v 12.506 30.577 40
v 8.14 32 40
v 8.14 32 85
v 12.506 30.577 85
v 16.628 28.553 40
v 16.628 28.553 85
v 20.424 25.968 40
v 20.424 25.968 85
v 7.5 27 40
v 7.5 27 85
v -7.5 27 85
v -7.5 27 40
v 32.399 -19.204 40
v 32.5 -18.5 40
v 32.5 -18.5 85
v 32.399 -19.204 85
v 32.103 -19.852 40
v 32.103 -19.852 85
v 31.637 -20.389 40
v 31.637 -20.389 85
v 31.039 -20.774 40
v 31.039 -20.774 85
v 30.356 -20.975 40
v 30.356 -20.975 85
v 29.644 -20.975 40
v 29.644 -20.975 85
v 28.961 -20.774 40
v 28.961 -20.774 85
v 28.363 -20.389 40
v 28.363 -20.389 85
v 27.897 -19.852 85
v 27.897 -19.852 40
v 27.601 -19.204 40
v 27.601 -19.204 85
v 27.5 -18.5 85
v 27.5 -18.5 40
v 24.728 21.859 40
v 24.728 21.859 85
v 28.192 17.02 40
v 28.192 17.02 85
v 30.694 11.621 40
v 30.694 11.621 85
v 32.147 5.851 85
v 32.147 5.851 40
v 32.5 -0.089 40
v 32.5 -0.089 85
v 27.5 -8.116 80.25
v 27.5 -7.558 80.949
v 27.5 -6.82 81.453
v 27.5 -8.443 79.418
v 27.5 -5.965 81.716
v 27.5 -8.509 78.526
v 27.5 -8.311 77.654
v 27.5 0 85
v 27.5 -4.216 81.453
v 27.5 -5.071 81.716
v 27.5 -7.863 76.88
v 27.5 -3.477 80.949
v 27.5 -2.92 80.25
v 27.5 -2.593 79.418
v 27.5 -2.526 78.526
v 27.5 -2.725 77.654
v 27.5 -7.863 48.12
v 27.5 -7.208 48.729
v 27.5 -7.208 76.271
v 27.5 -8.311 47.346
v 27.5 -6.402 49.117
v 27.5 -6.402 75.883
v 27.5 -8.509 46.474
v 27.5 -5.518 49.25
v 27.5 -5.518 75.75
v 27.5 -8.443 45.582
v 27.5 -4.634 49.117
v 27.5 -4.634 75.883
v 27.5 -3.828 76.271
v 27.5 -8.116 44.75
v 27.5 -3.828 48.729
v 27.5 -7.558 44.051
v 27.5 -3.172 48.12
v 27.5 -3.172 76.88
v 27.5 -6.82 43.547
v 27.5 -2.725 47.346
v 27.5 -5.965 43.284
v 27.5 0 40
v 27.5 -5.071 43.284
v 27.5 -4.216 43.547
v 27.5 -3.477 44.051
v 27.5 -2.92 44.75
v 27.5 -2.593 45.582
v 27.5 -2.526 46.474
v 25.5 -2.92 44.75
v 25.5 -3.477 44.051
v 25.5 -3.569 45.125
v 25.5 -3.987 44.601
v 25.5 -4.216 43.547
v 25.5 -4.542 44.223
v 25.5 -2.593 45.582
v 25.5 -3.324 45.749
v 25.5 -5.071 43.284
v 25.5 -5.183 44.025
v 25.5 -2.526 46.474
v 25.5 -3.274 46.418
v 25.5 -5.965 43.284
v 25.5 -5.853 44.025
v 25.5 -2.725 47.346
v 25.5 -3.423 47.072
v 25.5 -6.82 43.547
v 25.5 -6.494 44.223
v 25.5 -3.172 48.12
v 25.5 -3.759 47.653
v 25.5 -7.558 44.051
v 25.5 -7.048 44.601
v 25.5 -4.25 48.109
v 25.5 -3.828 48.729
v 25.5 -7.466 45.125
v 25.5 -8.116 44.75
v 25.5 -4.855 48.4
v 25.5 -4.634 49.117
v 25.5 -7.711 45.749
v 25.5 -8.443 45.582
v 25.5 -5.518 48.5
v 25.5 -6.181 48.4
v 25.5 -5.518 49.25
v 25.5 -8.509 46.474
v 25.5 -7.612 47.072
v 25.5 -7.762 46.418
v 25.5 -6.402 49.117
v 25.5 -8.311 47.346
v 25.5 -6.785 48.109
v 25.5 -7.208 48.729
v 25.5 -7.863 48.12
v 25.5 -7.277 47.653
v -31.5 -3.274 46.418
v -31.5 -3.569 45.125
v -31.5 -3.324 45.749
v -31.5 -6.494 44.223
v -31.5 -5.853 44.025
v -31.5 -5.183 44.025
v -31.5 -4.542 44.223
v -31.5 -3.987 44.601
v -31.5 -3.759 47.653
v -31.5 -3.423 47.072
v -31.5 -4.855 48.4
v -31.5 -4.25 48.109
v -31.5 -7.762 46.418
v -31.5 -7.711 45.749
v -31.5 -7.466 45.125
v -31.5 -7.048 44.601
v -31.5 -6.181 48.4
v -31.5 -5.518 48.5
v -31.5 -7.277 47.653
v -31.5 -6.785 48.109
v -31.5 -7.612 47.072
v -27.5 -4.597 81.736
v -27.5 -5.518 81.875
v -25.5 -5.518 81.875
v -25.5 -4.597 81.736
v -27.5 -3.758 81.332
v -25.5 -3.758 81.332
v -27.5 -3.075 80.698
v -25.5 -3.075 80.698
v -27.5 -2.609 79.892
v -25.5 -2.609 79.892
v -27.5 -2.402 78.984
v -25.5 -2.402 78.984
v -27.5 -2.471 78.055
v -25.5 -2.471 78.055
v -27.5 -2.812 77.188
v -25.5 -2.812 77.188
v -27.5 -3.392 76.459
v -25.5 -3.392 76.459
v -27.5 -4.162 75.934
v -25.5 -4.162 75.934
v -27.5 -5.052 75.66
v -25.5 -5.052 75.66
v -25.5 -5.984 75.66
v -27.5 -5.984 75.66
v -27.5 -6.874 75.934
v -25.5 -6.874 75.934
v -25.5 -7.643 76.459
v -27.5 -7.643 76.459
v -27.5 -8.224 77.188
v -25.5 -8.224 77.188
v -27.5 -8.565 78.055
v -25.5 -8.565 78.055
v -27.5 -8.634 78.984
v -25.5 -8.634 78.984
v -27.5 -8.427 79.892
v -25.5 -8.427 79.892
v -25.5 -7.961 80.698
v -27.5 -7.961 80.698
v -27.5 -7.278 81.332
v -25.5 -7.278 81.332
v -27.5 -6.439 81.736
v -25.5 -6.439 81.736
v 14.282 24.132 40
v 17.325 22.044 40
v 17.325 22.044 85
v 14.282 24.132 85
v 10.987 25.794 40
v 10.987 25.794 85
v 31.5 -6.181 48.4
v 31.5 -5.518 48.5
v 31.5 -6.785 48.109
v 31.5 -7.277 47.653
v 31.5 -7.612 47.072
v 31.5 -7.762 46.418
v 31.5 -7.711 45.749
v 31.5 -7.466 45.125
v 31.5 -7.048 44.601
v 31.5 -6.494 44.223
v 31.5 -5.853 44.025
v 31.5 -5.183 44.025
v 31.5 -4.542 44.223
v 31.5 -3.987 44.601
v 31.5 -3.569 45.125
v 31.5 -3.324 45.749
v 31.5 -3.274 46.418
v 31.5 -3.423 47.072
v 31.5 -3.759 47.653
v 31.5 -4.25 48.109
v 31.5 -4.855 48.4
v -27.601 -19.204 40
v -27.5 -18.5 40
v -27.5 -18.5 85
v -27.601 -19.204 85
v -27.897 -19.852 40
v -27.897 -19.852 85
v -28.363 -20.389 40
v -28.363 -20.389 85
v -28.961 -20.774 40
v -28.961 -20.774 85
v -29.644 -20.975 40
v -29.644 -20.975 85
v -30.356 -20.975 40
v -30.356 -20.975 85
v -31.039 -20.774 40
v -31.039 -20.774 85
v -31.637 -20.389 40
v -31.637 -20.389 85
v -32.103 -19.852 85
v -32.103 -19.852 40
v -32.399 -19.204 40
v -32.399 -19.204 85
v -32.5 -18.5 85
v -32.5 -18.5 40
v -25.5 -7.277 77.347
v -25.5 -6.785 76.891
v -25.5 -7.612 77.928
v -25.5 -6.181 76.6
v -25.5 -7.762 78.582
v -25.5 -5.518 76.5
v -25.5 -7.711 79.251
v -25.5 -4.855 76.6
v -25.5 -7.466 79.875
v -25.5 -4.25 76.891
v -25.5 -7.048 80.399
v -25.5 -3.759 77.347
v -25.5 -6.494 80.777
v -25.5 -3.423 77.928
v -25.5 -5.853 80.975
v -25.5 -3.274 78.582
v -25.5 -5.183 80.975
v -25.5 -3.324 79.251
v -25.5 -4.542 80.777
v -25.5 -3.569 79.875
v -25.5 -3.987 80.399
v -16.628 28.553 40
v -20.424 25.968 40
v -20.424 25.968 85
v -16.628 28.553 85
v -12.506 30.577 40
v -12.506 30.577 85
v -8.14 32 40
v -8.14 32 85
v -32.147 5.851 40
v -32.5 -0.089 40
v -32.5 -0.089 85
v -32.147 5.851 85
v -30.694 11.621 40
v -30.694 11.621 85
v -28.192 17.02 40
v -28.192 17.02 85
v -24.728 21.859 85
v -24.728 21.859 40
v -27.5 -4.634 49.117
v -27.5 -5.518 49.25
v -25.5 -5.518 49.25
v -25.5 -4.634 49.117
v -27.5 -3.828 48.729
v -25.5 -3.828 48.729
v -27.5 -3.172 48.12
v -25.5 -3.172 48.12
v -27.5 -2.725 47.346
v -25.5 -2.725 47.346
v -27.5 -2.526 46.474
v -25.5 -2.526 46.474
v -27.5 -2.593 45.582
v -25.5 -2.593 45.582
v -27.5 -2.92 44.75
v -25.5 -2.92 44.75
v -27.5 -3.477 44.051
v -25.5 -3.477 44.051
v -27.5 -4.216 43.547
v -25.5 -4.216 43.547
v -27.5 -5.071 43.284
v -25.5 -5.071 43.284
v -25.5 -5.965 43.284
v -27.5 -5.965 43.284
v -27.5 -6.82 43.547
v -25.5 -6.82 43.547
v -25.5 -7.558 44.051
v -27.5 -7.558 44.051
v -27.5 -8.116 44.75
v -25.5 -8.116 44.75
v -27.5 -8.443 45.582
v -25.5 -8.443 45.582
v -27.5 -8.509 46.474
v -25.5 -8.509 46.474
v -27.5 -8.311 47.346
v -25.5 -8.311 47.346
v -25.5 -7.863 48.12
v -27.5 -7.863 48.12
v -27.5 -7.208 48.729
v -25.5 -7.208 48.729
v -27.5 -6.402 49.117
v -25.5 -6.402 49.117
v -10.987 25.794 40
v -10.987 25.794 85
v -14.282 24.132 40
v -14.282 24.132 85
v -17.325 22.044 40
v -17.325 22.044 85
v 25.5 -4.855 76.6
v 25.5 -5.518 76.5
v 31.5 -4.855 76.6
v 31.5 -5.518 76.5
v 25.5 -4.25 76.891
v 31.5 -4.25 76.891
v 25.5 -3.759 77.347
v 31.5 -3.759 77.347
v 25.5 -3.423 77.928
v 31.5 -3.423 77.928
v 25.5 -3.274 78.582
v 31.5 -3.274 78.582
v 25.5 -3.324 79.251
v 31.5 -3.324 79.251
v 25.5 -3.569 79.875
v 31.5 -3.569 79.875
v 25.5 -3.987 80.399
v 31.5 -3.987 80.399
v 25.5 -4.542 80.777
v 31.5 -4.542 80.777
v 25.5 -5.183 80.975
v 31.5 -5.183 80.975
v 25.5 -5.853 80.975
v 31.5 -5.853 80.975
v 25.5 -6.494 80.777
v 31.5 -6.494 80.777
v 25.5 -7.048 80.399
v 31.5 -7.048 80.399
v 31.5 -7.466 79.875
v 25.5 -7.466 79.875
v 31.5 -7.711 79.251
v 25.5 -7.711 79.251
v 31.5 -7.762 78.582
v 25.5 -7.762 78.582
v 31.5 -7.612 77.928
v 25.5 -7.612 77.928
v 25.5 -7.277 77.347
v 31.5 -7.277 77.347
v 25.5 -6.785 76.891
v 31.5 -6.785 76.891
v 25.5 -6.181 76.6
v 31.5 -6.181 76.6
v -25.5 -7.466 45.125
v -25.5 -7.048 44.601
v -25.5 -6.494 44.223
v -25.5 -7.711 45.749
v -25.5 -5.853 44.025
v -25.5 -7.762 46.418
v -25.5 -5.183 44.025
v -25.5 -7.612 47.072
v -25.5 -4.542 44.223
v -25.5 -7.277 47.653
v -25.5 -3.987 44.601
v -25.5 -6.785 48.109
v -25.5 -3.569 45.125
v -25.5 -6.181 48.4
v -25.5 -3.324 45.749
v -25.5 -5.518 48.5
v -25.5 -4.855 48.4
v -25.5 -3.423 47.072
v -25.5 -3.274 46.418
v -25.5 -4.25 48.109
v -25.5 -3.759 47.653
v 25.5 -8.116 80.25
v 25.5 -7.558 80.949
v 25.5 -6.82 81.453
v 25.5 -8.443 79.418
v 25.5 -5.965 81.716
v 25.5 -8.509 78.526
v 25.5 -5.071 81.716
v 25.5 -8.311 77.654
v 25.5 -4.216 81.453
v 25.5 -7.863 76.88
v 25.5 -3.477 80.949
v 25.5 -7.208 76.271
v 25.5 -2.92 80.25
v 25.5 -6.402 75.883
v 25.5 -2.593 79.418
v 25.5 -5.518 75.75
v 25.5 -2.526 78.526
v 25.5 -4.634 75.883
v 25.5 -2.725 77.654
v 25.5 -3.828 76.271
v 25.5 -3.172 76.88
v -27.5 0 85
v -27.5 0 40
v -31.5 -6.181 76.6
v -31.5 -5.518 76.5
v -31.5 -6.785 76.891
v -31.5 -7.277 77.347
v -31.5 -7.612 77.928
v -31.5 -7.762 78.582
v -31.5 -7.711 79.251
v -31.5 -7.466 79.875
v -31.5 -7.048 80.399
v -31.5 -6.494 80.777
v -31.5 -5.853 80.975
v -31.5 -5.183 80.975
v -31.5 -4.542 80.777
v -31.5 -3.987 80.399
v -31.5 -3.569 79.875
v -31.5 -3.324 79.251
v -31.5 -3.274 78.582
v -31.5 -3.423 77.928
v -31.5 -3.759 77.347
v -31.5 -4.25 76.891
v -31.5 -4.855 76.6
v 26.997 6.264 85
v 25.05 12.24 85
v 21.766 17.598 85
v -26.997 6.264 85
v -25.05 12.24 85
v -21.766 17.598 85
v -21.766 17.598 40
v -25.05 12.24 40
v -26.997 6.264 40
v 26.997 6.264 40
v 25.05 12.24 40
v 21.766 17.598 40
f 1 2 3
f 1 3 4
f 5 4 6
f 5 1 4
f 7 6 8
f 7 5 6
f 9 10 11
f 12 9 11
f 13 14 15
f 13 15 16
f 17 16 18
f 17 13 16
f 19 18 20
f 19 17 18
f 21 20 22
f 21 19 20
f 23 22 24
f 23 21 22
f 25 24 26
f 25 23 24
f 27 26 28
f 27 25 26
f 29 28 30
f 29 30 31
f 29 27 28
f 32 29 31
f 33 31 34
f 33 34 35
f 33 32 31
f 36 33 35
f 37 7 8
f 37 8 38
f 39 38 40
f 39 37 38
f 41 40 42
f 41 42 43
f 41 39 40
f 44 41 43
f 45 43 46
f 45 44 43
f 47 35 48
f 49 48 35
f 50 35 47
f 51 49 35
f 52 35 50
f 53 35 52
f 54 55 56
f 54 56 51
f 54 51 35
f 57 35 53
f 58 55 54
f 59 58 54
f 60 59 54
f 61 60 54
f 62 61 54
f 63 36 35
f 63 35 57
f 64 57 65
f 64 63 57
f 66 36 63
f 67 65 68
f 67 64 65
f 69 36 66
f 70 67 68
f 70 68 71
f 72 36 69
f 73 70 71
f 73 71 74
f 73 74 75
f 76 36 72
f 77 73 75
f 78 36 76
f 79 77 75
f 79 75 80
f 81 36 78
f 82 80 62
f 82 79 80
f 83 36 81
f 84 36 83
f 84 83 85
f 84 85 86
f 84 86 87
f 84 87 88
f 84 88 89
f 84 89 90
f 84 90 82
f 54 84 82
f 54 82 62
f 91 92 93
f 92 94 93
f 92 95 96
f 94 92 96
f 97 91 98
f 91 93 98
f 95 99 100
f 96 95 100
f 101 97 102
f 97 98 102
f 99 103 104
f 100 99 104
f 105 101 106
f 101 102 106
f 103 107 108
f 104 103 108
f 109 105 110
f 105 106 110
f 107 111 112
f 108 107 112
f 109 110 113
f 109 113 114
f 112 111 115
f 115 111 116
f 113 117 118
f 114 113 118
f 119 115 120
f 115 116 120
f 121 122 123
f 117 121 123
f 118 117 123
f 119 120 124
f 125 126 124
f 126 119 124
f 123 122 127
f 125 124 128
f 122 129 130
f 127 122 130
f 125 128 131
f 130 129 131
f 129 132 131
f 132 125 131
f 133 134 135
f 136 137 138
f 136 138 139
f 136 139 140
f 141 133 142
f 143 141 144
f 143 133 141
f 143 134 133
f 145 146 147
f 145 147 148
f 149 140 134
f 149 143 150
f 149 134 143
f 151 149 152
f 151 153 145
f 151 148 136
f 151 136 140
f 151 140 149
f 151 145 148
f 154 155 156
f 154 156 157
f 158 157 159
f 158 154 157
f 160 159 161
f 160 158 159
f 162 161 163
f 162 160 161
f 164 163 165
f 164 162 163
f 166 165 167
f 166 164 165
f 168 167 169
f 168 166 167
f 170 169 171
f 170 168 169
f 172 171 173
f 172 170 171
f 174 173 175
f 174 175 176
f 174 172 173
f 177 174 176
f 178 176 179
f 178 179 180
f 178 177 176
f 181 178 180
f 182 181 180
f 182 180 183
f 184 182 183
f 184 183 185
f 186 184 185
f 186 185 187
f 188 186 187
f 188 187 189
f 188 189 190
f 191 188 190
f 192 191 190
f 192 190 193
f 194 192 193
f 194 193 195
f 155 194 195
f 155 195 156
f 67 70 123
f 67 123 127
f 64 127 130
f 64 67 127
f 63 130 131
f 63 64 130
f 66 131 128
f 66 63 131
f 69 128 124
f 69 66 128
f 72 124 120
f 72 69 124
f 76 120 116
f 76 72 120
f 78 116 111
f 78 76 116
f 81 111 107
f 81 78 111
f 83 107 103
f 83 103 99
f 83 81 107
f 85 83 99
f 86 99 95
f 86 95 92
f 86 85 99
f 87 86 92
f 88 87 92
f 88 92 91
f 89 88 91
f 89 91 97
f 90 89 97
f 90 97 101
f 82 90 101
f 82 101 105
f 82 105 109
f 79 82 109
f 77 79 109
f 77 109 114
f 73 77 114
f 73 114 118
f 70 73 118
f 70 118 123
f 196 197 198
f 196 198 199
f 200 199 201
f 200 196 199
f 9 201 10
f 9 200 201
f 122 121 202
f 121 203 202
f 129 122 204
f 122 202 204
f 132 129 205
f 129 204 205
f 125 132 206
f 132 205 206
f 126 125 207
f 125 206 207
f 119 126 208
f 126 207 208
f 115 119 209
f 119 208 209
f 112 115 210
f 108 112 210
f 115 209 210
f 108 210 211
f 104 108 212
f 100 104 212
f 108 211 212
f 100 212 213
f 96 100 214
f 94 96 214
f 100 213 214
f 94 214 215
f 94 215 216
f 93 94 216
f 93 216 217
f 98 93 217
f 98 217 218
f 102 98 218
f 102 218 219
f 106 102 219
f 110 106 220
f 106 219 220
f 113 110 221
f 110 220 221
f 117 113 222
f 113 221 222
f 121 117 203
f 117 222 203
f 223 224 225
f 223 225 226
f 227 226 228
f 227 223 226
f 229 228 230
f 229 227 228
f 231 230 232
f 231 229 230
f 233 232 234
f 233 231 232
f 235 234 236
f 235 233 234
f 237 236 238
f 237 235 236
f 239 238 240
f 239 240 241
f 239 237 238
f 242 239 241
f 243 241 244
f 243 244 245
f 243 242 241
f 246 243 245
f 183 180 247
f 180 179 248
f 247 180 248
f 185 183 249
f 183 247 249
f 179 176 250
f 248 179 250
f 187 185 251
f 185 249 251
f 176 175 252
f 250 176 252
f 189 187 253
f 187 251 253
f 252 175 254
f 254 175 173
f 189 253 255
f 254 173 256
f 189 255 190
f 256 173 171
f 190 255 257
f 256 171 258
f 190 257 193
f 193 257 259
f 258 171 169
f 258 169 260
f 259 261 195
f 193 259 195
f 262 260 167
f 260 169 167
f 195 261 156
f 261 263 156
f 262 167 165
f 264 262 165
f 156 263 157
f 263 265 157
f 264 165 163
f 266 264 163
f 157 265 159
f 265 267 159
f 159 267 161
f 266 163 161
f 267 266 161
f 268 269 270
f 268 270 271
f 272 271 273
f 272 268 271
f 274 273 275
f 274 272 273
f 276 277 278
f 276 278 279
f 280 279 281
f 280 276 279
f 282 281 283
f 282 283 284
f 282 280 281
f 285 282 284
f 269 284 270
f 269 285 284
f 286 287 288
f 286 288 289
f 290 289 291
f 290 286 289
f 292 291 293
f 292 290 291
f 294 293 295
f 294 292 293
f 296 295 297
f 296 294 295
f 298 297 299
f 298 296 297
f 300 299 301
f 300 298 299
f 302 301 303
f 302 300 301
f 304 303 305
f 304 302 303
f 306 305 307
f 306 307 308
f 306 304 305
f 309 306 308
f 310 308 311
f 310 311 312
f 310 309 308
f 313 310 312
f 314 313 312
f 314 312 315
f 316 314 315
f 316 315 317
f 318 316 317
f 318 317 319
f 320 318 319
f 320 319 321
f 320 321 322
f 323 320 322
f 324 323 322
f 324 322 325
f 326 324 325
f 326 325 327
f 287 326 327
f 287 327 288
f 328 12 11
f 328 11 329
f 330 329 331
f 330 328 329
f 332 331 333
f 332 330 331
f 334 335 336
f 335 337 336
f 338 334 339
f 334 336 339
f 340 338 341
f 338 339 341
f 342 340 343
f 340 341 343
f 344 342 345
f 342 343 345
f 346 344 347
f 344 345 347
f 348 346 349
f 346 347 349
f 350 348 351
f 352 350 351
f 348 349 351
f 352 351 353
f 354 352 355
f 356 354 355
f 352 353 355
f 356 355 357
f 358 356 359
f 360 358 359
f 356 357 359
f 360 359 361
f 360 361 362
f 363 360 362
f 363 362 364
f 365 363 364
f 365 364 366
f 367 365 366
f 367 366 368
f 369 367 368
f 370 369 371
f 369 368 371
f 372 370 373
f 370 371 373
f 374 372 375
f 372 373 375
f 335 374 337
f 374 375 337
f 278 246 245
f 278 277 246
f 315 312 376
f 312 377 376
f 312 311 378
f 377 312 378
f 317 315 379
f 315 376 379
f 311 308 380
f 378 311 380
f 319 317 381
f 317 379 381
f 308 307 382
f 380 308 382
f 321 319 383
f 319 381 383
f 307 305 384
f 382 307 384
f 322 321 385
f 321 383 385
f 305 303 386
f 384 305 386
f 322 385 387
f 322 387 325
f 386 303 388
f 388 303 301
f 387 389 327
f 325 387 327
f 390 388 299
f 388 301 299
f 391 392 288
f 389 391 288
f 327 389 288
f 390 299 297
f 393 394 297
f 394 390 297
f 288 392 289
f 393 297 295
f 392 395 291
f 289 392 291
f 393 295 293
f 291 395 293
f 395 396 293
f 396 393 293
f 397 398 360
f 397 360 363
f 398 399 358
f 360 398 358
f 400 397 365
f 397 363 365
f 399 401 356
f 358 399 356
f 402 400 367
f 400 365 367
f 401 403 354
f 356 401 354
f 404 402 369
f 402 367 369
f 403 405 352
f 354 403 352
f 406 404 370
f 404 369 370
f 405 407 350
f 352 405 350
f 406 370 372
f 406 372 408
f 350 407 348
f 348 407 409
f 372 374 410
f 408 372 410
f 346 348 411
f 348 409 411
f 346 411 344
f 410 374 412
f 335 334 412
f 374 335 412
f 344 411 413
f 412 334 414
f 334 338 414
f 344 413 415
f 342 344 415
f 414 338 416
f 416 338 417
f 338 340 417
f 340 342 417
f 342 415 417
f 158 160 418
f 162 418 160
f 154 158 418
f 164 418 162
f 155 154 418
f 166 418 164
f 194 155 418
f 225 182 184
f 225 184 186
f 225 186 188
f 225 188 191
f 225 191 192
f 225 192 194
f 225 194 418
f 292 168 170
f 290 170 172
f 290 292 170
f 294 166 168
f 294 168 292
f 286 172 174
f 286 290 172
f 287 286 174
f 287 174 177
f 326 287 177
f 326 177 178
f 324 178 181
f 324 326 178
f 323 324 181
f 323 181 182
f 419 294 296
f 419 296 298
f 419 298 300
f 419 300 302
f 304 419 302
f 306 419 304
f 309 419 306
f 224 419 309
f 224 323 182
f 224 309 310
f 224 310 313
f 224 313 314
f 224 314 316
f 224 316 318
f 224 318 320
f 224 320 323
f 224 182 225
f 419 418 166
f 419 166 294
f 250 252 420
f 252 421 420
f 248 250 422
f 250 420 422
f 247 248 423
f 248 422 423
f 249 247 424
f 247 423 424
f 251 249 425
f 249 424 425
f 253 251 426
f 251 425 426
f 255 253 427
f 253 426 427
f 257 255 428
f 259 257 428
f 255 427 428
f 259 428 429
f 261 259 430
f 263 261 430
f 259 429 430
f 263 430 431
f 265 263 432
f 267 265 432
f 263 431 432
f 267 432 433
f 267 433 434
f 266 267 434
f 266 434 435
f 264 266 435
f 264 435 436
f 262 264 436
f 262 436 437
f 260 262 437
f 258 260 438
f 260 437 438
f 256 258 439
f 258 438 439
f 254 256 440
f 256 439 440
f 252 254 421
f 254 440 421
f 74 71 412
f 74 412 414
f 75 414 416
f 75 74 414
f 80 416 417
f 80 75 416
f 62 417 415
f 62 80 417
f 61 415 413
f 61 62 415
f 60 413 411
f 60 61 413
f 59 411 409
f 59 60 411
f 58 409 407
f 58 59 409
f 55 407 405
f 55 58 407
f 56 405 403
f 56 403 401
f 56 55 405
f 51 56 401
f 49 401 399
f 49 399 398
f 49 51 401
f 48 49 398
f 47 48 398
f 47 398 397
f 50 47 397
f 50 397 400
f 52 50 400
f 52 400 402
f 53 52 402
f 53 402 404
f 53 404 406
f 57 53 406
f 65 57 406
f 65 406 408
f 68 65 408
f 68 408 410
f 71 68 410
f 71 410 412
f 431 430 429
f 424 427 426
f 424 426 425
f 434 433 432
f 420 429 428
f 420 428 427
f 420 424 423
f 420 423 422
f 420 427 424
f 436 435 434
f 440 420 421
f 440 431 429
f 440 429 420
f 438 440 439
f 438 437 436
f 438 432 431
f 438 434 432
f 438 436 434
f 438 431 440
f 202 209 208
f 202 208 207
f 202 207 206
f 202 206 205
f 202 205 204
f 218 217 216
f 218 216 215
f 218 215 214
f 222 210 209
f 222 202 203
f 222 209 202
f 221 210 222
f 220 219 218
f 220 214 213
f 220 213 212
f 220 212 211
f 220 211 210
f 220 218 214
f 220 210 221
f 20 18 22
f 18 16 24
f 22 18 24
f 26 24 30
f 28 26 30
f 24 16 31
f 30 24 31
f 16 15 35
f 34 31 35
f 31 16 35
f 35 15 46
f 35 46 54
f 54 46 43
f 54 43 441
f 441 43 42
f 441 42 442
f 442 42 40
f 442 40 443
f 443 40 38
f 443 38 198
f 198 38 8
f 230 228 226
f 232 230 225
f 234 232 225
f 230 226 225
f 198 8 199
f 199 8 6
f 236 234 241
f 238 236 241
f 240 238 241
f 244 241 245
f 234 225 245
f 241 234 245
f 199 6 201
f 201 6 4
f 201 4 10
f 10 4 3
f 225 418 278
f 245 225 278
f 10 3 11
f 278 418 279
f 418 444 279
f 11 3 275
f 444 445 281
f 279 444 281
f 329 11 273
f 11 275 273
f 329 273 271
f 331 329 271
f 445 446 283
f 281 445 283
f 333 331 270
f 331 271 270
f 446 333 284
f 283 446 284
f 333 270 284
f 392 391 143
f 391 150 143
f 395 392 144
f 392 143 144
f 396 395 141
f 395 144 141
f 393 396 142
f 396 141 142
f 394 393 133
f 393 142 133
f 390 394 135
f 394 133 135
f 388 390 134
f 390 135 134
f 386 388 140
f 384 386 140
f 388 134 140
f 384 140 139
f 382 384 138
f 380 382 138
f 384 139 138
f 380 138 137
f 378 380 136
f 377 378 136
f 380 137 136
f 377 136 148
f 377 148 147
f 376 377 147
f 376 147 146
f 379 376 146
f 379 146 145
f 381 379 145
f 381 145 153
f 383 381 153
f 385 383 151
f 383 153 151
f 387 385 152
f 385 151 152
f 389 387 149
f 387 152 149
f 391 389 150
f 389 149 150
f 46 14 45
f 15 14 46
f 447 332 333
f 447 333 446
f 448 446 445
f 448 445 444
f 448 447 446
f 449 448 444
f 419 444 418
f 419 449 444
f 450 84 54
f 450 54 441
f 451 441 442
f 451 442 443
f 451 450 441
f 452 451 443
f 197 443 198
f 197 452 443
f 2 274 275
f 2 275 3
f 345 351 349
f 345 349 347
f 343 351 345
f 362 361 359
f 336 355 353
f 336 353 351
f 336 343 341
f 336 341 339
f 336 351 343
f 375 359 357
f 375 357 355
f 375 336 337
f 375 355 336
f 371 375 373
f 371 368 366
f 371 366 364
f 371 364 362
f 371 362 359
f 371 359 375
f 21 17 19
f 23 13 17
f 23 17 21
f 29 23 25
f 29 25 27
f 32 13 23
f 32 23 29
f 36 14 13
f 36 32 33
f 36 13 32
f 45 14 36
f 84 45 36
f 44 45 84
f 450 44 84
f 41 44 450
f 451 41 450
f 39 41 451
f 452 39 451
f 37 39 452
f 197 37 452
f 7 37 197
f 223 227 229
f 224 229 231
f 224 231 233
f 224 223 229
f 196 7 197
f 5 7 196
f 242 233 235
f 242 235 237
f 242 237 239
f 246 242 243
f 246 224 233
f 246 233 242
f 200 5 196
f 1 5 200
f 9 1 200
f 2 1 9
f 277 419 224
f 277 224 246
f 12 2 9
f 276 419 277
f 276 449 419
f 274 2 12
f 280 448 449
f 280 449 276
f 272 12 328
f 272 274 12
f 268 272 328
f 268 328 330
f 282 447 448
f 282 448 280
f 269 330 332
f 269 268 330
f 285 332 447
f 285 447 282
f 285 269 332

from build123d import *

# Parameters (mm, degrees)
SKETCH1_W                           = 50
SKETCH1_H                           = 50
BOSS_EXTRUDE1_DEPTH                 = 60
CUT_EXTRUDE1_DEPTH                  = 60
CUT_EXTRUDE2_START                  = -60
CUT_EXTRUDE2_DEPTH                  = 60
SKETCH5_OUTSIDE_W                   = 70.548
SKETCH5_OUTSIDE_H                   = 70.548
CUT_EXTRUDE3_DEPTH                  = 10
CUT_EXTRUDE4_DEPTH                  = 10
FILLET1_R                           = 1
SKETCH7_R                           = 2
BOSS_EXTRUDE2_DEPTH                 = 2
BOSS_EXTRUDE3_START                 = 2
SKETCH8_R                           = 2
BOSS_EXTRUDE3_DEPTH                 = 2
SKETCH9_R                           = 2.25
CUT_EXTRUDE5_DEPTH                  = 2
CUT_EXTRUDE6_START                  = -2
SKETCH10_R                          = 2.25
CUT_EXTRUDE6_DEPTH                  = 2
FILLET2_R                           = 1
CUT_EXTRUDE7_REACH                  = 71.642
CUT_EXTRUDE7_END_RADIUS             = 25
CUT_EXTRUDE7_DIRECTION_2_REACH      = 71.642
CUT_EXTRUDE7_DIRECTION_2_END_RADIUS = 25
BOSS_EXTRUDE4_DEPTH                 = 35
BOSS_EXTRUDE4_DEPTH_BACK            = 10
SKETCH14_R                          = 2
BOSS_EXTRUDE5_DEPTH                 = 0.1
SKETCH15_R                          = 3
SKETCH15_R_2                        = 2.25
BOSS_EXTRUDE6_DEPTH                 = 7
SKETCH16_R                          = 2.25
CUT_EXTRUDE8_DEPTH                  = 2
SKETCH17_W                          = 10
SKETCH17_H                          = 10
CUT_EXTRUDE9_DEPTH                  = 29.758852585
SKETCH18_W                          = 10
SKETCH18_H                          = 14.003619208
CUT_EXTRUDE10_DEPTH                 = 31.758852585
SKETCH20_R                          = 3
SKETCH20_R_2                        = 2.25
BOSS_EXTRUDE8_DEPTH                 = 7
SKETCH21_R                          = 2.25
CUT_EXTRUDE11_DEPTH                 = 4
CUT_EXTRUDE12_DEPTH                 = 40
SKETCH23_R                          = 2.25
CUT_EXTRUDE13_DEPTH                 = 4
SKETCH24_R                          = 2.25
CUT_EXTRUDE14_DEPTH                 = 2
SKETCH25_R                          = 3.125
SKETCH25_R_2                        = 2.25
BOSS_EXTRUDE9_DEPTH                 = 7
SKETCH26_R                          = 2.25
CUT_EXTRUDE15_DEPTH                 = 4


# Read off the part's stored shape, not the designer's step: Cut-Extrude2
with BuildPart() as part:
    # Sketch1 → Boss-Extrude1 (new body)
    with BuildSketch(Plane.XY):
        Rectangle(SKETCH1_W, SKETCH1_H)
    extrude(amount=BOSS_EXTRUDE1_DEPTH)

    # Sketch3 → Cut-Extrude1 (cut)
    with BuildSketch(Plane.XY.offset(60)):
        with BuildLine():
            Line((-25, 25), (-25, 0))
            ThreePointArc((-25, 0), (-17.677669541, 17.677669518), (-3.2e-08, 25))
            Line((-3.2e-08, 25), (-25, 25))
        make_face()
        with BuildLine():
            Line((25, 25), (-3.2e-08, 25))
            ThreePointArc((-3.2e-08, 25), (17.677669518, 17.677669541), (25, 0))
            Line((25, 0), (25, 25))
        make_face()
    extrude(amount=-CUT_EXTRUDE1_DEPTH, mode=Mode.SUBTRACT)

    # Cut-Extrude2 outline → Cut-Extrude2 (cut)
    with BuildSketch(Plane.XY.offset(60).offset(CUT_EXTRUDE2_START)):
        with BuildLine():
            ThreePointArc((8.576916353, -23.025834486), (10.616475204, -9.420494413), (7.92577262, 4.071177033))
            ThreePointArc((7.92577262, 4.071177033), (0, 9.5), (-7.92577262, 4.071177033))
            ThreePointArc((-7.92577262, 4.071177033), (-10.616475204, -9.420494413), (-8.576916353, -23.025834486))
            ThreePointArc((-8.576916353, -23.025834486), (-8.783191003, -24.377140732), (-10, -25))
            Line((-10, -25), (10, -25))
            ThreePointArc((10, -25), (8.783191003, -24.377140732), (8.576916353, -23.025834486))
        make_face()
        with BuildLine():
            ThreePointArc((25, -11.035759956), (21.246950766, -20.57515197), (12, -25))
            Line((12, -25), (25, -25))
            Line((25, -25), (25, -11.035759956))
        make_face()
        with BuildLine():
            Line((-25, -25), (-12, -25))
            ThreePointArc((-12, -25), (-21.246950766, -20.57515197), (-25, -11.035759956))
            Line((-25, -11.035759956), (-25, -25))
        make_face()
    extrude(amount=CUT_EXTRUDE2_DEPTH, mode=Mode.SUBTRACT)

    # Sketch5 outside → Cut-Extrude3 (cut)
    with BuildSketch(Plane.XY.offset(60)):
        Rectangle(SKETCH5_OUTSIDE_W, SKETCH5_OUTSIDE_H)
        with BuildLine():
            Line((-7.92577262, 4.071177033), (-12.879426293, 4.071177033))
            Line((-12.879426293, 4.071177033), (-12.879426293, -5.928822967))
            Line((-12.879426293, -5.928822967), (-10.379426293, -5.928822967))
            ThreePointArc((-10.379426293, -5.928822967), (-9.475712618, -0.849542187), (-7.92577262, 4.071177033))
        make_face(mode=Mode.SUBTRACT)
        with BuildLine():
            Line((7.92577262, 4.071177033), (12.879426293, 4.071177033))
            Line((12.879426293, 4.071177033), (12.879426293, -5.928822967))
            Line((12.879426293, -5.928822967), (10.379426293, -5.928822967))
            ThreePointArc((10.379426293, -5.928822967), (9.475712618, -0.849542187), (7.92577262, 4.071177033))
        make_face(mode=Mode.SUBTRACT)
    extrude(amount=-CUT_EXTRUDE3_DEPTH, mode=Mode.SUBTRACT)

    # Sketch6 → Cut-Extrude4 (cut)
    # profile 1 of 4: a face of its own
    with BuildSketch(Plane(origin=(0, 0, 0), x_dir=(-1, 0, 0), z_dir=(0, 0, -1))):
        with BuildLine():
            Line((0, 9.5), (0, 25))
            ThreePointArc((0, 25), (-17.67766953, 17.67766953), (-25, 0))
            Line((-25, 0), (-25, -11.035759956))
            ThreePointArc((-25, -11.035759956), (-21.246950766, -20.57515197), (-12, -25))
            Line((-12, -25), (-10, -25))
            ThreePointArc((-10, -25), (-8.783191003, -24.377140732), (-8.576916353, -23.025834486))
            ThreePointArc((-8.576916353, -23.025834486), (-10.289550459, -15.574005024), (-10.552980025, -7.932442175))
            ThreePointArc((-10.552980025, -7.932442175), (-10.478797406, -6.929541656), (-10.379426293, -5.928822967))
            ThreePointArc((-10.379426293, -5.928822967), (-9.475712618, -0.849542187), (-7.92577262, 4.071177033))
            ThreePointArc((-7.92577262, 4.071177033), (-4.803383975, 8.012667281), (0, 9.5))
        make_face()
        with BuildLine():
            Line((-12.879426293, 6.071177033), (-12.879426293, 3.071177033))
            Line((-12.879426293, 3.071177033), (-12.879426293, -4.928822967))
            Line((-12.879426293, -4.928822967), (-12.879426293, -7.932442175))
            Line((-12.879426293, -7.932442175), (-14.879423018, -7.932442175))
            ThreePointArc((-14.879423018, -7.932442175), (-15.586532115, -7.639547997), (-15.879426293, -6.932438901))
            Line((-15.879426293, -6.932438901), (-15.879426293, 5.071173759))
            ThreePointArc((-15.879426293, 5.071173759), (-15.586532115, 5.778282855), (-14.879423018, 6.071177033))
            Line((-14.879423018, 6.071177033), (-12.879426293, 6.071177033))
        make_face(mode=Mode.SUBTRACT)
    # profile 2 of 4: a face of its own
    with BuildSketch(Plane(origin=(0, 0, 0), x_dir=(-1, 0, 0), z_dir=(0, 0, -1))):
        with BuildLine():
            ThreePointArc((25, 0), (17.67766953, 17.67766953), (0, 25))
            Line((0, 25), (0, 9.5))
            ThreePointArc((0, 9.5), (4.803383975, 8.012667281), (7.92577262, 4.071177033))
            ThreePointArc((7.92577262, 4.071177033), (10.616475204, -9.420494413), (8.576916353, -23.025834486))
            ThreePointArc((8.576916353, -23.025834486), (8.783191003, -24.377140732), (10, -25))
            Line((10, -25), (12, -25))
            ThreePointArc((12, -25), (21.246950766, -20.57515197), (25, -11.035759956))
            Line((25, -11.035759956), (25, 0))
        make_face()
        with BuildLine():
            Line((12.879426293, -4.928822967), (12.879426293, 3.071177033))
            Line((12.879426293, 3.071177033), (12.879426293, 6.071177033))
            Line((12.879426293, 6.071177033), (14.879423018, 6.071177033))
            ThreePointArc((14.879423018, 6.071177033), (15.586532115, 5.778282855), (15.879426293, 5.071173759))
            Line((15.879426293, 5.071173759), (15.879426293, -6.932438901))
            ThreePointArc((15.879426293, -6.932438901), (15.586532115, -7.639547997), (14.879423018, -7.932442175))
            Line((14.879423018, -7.932442175), (12.879426293, -7.932442175))
            Line((12.879426293, -7.932442175), (12.879426293, -4.928822967))
        make_face(mode=Mode.SUBTRACT)
    # profile 3 of 4: a face of its own
    with BuildSketch(Plane(origin=(0, 0, 0), x_dir=(-1, 0, 0), z_dir=(0, 0, -1))):
        with BuildLine():
            Line((0, 9.5), (0, 25))
            ThreePointArc((0, 25), (-17.67766953, 17.67766953), (-25, 0))
            Line((-25, 0), (-25, -11.035759956))
            ThreePointArc((-25, -11.035759956), (-21.246950766, -20.57515197), (-12, -25))
            Line((-12, -25), (-10, -25))
            ThreePointArc((-10, -25), (-8.783191003, -24.377140732), (-8.576916353, -23.025834486))
            ThreePointArc((-8.576916353, -23.025834486), (-10.289550459, -15.574005024), (-10.552980025, -7.932442175))
            ThreePointArc((-10.552980025, -7.932442175), (-10.478797406, -6.929541656), (-10.379426293, -5.928822967))
            ThreePointArc((-10.379426293, -5.928822967), (-9.475712618, -0.849542187), (-7.92577262, 4.071177033))
            ThreePointArc((-7.92577262, 4.071177033), (-4.803383975, 8.012667281), (0, 9.5))
        make_face()
        with BuildLine():
            Line((-12.879426293, 6.071177033), (-12.879426293, 3.071177033))
            Line((-12.879426293, 3.071177033), (-12.879426293, -4.928822967))
            Line((-12.879426293, -4.928822967), (-12.879426293, -7.932442175))
            Line((-12.879426293, -7.932442175), (-14.879423018, -7.932442175))
            ThreePointArc((-14.879423018, -7.932442175), (-15.586532115, -7.639547997), (-15.879426293, -6.932438901))
            Line((-15.879426293, -6.932438901), (-15.879426293, 5.071173759))
            ThreePointArc((-15.879426293, 5.071173759), (-15.586532115, 5.778282855), (-14.879423018, 6.071177033))
            Line((-14.879423018, 6.071177033), (-12.879426293, 6.071177033))
        make_face(mode=Mode.SUBTRACT)
    # profile 4 of 4: a face of its own
    with BuildSketch(Plane(origin=(0, 0, 0), x_dir=(-1, 0, 0), z_dir=(0, 0, -1))):
        with BuildLine():
            ThreePointArc((25, 0), (17.67766953, 17.67766953), (0, 25))
            Line((0, 25), (0, 9.5))
            ThreePointArc((0, 9.5), (4.803383975, 8.012667281), (7.92577262, 4.071177033))
            ThreePointArc((7.92577262, 4.071177033), (10.616475204, -9.420494413), (8.576916353, -23.025834486))
            ThreePointArc((8.576916353, -23.025834486), (8.783191003, -24.377140732), (10, -25))
            Line((10, -25), (12, -25))
            ThreePointArc((12, -25), (21.246950766, -20.57515197), (25, -11.035759956))
            Line((25, -11.035759956), (25, 0))
        make_face()
        with BuildLine():
            Line((12.879426293, -4.928822967), (12.879426293, 3.071177033))
            Line((12.879426293, 3.071177033), (12.879426293, 6.071177033))
            Line((12.879426293, 6.071177033), (14.879423018, 6.071177033))
            ThreePointArc((14.879423018, 6.071177033), (15.586532115, 5.778282855), (15.879426293, 5.071173759))
            Line((15.879426293, 5.071173759), (15.879426293, -6.932438901))
            ThreePointArc((15.879426293, -6.932438901), (15.586532115, -7.639547997), (14.879423018, -7.932442175))
            Line((14.879423018, -7.932442175), (12.879426293, -7.932442175))
            Line((12.879426293, -7.932442175), (12.879426293, -4.928822967))
        make_face(mode=Mode.SUBTRACT)
    extrude(amount=-CUT_EXTRUDE4_DEPTH, mode=Mode.SUBTRACT)

    # Fillet1
    fillet1_edges = [part.edges().sort_by_distance(p)[0] for p in [
        (12.879426293, 4.071177033, 55),
        (12.879426293, -5.928822967, 55),
        (-12.879426293, -5.928822967, 55),
        (-12.879426293, 4.071177033, 55),
    ]]
    fillet(fillet1_edges, radius=FILLET1_R)

    # Sketch7 → Boss-Extrude2 (add)
    with BuildSketch(Plane.ZY.offset(12.879426293)):
        with Locations(Location((55, -0.928822967, 0), (0, 0, 270))):
            Circle(SKETCH7_R)
    extrude(amount=BOSS_EXTRUDE2_DEPTH)

    # Sketch8 → Boss-Extrude3 (add)
    with BuildSketch(Plane(origin=(12.879426293, 0, 0), x_dir=(0, 0, -1), z_dir=(1, 0, 0)).offset(BOSS_EXTRUDE3_START)):
        with Locations(Location((-55, -0.928822967, 0), (0, 0, 270))):
            Circle(SKETCH8_R)
    extrude(amount=-BOSS_EXTRUDE3_DEPTH)

    # Sketch9 → Cut-Extrude5 (cut)
    with BuildSketch(Plane.ZY.offset(-12.879426293)):
        with Locations(Location((5, -0.930632571, 0), (0, 0, 270))):
            Circle(SKETCH9_R)
    extrude(amount=-CUT_EXTRUDE5_DEPTH, mode=Mode.SUBTRACT)

    # Sketch10 → Cut-Extrude6 (cut)
    with BuildSketch(Plane(origin=(-12.879426293, 0, 0), x_dir=(0, 0, -1), z_dir=(1, 0, 0)).offset(CUT_EXTRUDE6_START)):
        with Locations(Location((-5, -0.930632571, 0), (0, 0, 270))):
            Circle(SKETCH10_R)
    extrude(amount=CUT_EXTRUDE6_DEPTH, mode=Mode.SUBTRACT)

    # Fillet2
    fillet2_edges = [part.edges().sort_by_distance(p)[0] for p in [
        (-12.879426293, 6.071177033, 5),
        (-12.879426293, -7.932442175, 5),
        (12.879426293, -7.932442175, 5),
        (12.879426293, 6.071177033, 5),
    ]]
    fillet(fillet2_edges, radius=FILLET2_R)

    # Cut-Extrude7: up to this cylinder (the profile starts inside it)
    cut_extrude7_end = Plane(origin=(0, 0, 27.7442175), z_dir=(0, 0, 1)) * Cylinder(CUT_EXTRUDE7_END_RADIUS, 227.198087, mode=Mode.PRIVATE)
    # Sketch11 → Cut-Extrude7 (cut, up to the surface)
    with BuildSketch(Plane(origin=(0, 0, 0), x_dir=(0, 0, -1), z_dir=(1, 0, 0)), mode=Mode.PRIVATE) as cut_extrude7_sk1:
        with BuildLine():
            add(Edge.make_bspline(
                [(-50, 12.5), (-45.835040113, 20.240050977), (-37.917520056, 24.110076465), (-30, 24.110076465)],
                knots=[0, 0, 0, 0, 0.5, 0.5, 0.5, 0.5], degree=3))
            Line((-30, 24.110076465), (-30, 25))
            Line((-30, 25), (-50, 25))
            Line((-50, 25), (-50, 12.5))
        make_face()
    cut_extrude7_tool1 = extrude(cut_extrude7_sk1.sketch, amount=CUT_EXTRUDE7_REACH, mode=Mode.PRIVATE) & cut_extrude7_end
    add(cut_extrude7_tool1.solids().sort_by_distance((0, 21.671006, 44.201261))[0], mode=Mode.SUBTRACT)
    # Sketch11 → Cut-Extrude7 (cut, up to the surface)
    with BuildSketch(Plane(origin=(0, 0, 0), x_dir=(0, 0, -1), z_dir=(1, 0, 0)), mode=Mode.PRIVATE) as cut_extrude7_sk2:
        with BuildLine():
            add(Edge.make_bspline(
                [(-30, 24.110076465), (-22.082479944, 24.110076465), (-14.164959887, 20.240050977), (-10, 12.5)],
                knots=[0.5, 0.5, 0.5, 0.5, 1, 1, 1, 1], degree=3))
            ThreePointArc((-10, 12.5), (-11.128726859, 19.123824427), (-14.387505004, 25))
            Line((-14.387505004, 25), (-30, 25))
            Line((-30, 25), (-30, 24.110076465))
        make_face()
    cut_extrude7_tool2 = extrude(cut_extrude7_sk2.sketch, amount=CUT_EXTRUDE7_REACH, mode=Mode.PRIVATE) & cut_extrude7_end
    add(cut_extrude7_tool2.solids().sort_by_distance((0, 21.59828, 16.984521))[0], mode=Mode.SUBTRACT)
    # Sketch11 → Cut-Extrude7 (cut, up to the surface)
    with BuildSketch(Plane(origin=(0, 0, 0), x_dir=(0, 0, -1), z_dir=(1, 0, 0)), mode=Mode.PRIVATE) as cut_extrude7_sk3:
        with BuildLine():
            ThreePointArc((-14.387505004, 25), (-11.128726859, 19.123824427), (-10, 12.5))
            Line((-10, 12.5), (-10, 25))
            Line((-10, 25), (-14.387505004, 25))
        make_face()
    cut_extrude7_tool3 = extrude(cut_extrude7_sk3.sketch, amount=CUT_EXTRUDE7_REACH, mode=Mode.PRIVATE) & cut_extrude7_end
    add(cut_extrude7_tool3.solids().sort_by_distance((0, 21.947708, 11.287174))[0], mode=Mode.SUBTRACT)

    # Cut-Extrude7 direction 2: up to this cylinder (the profile starts inside it)
    cut_extrude7_direction_2_end = Plane(origin=(0, 0, 27.7442175), z_dir=(0, 0, 1)) * Cylinder(CUT_EXTRUDE7_DIRECTION_2_END_RADIUS, 227.198087, mode=Mode.PRIVATE)
    # Sketch11 → Cut-Extrude7 direction 2 (cut, up to the surface)
    with BuildSketch(Plane(origin=(0, 0, 0), x_dir=(0, 0, -1), z_dir=(1, 0, 0)), mode=Mode.PRIVATE) as cut_extrude7_direction_2_sk1:
        with BuildLine():
            add(Edge.make_bspline(
                [(-50, 12.5), (-45.835040113, 20.240050977), (-37.917520056, 24.110076465), (-30, 24.110076465)],
                knots=[0, 0, 0, 0, 0.5, 0.5, 0.5, 0.5], degree=3))
            Line((-30, 24.110076465), (-30, 25))
            Line((-30, 25), (-50, 25))
            Line((-50, 25), (-50, 12.5))
        make_face()
    cut_extrude7_direction_2_tool1 = extrude(cut_extrude7_direction_2_sk1.sketch, amount=-CUT_EXTRUDE7_DIRECTION_2_REACH, mode=Mode.PRIVATE) & cut_extrude7_direction_2_end
    add(cut_extrude7_direction_2_tool1.solids().sort_by_distance((0, 21.671006, 44.201261))[0], mode=Mode.SUBTRACT)
    # Sketch11 → Cut-Extrude7 direction 2 (cut, up to the surface)
    with BuildSketch(Plane(origin=(0, 0, 0), x_dir=(0, 0, -1), z_dir=(1, 0, 0)), mode=Mode.PRIVATE) as cut_extrude7_direction_2_sk2:
        with BuildLine():
            add(Edge.make_bspline(
                [(-30, 24.110076465), (-22.082479944, 24.110076465), (-14.164959887, 20.240050977), (-10, 12.5)],
                knots=[0.5, 0.5, 0.5, 0.5, 1, 1, 1, 1], degree=3))
            ThreePointArc((-10, 12.5), (-11.128726859, 19.123824427), (-14.387505004, 25))
            Line((-14.387505004, 25), (-30, 25))
            Line((-30, 25), (-30, 24.110076465))
        make_face()
    cut_extrude7_direction_2_tool2 = extrude(cut_extrude7_direction_2_sk2.sketch, amount=-CUT_EXTRUDE7_DIRECTION_2_REACH, mode=Mode.PRIVATE) & cut_extrude7_direction_2_end
    add(cut_extrude7_direction_2_tool2.solids().sort_by_distance((0, 21.59828, 16.984521))[0], mode=Mode.SUBTRACT)
    # Sketch11 → Cut-Extrude7 direction 2 (cut, up to the surface)
    with BuildSketch(Plane(origin=(0, 0, 0), x_dir=(0, 0, -1), z_dir=(1, 0, 0)), mode=Mode.PRIVATE) as cut_extrude7_direction_2_sk3:
        with BuildLine():
            ThreePointArc((-14.387505004, 25), (-11.128726859, 19.123824427), (-10, 12.5))
            Line((-10, 12.5), (-10, 25))
            Line((-10, 25), (-14.387505004, 25))
        make_face()
    cut_extrude7_direction_2_tool3 = extrude(cut_extrude7_direction_2_sk3.sketch, amount=-CUT_EXTRUDE7_DIRECTION_2_REACH, mode=Mode.PRIVATE) & cut_extrude7_direction_2_end
    add(cut_extrude7_direction_2_tool3.solids().sort_by_distance((0, 21.947708, 11.287174))[0], mode=Mode.SUBTRACT)

    # Sketch14 → Boss-Extrude5 (add)
    with BuildSketch(Plane.ZY.offset(25)):
        with Locations(Location((46.25, -5.517879978, 0), (0, 0, 180))):
            Circle(SKETCH14_R)
    extrude(amount=BOSS_EXTRUDE5_DEPTH)

    # Sketch17 → Cut-Extrude9 (cut)
    with BuildSketch(Plane.ZY.offset(14.879426293)):
        with Locations((55, -0.928822967)):
            Rectangle(SKETCH17_W, SKETCH17_H)
    extrude(amount=-CUT_EXTRUDE9_DEPTH, mode=Mode.SUBTRACT)

    # Sketch18 → Cut-Extrude10 (cut)
    with BuildSketch(Plane.ZY.offset(15.879426293)):
        with Locations((5, -0.930632571)):
            Rectangle(SKETCH18_W, SKETCH18_H)
    extrude(amount=-CUT_EXTRUDE10_DEPTH, mode=Mode.SUBTRACT)

    # Sketch22 → Cut-Extrude12 (cut)
    with BuildSketch(Plane(origin=(0, 0, 10), x_dir=(-1, 0, 0), z_dir=(0, 0, -1))):
        with BuildLine():
            ThreePointArc((13.927271842, 22.269557575), (22.703581778, 12.718484283), (25.250496515, 0))
            Line((25.250496515, 0), (25.250496515, -10.329981393))
            Line((25.250496515, -10.329981393), (25.250496515, -25.890161066))
            Line((25.250496515, -25.890161066), (-25, -25.890161066))
            Line((-25, -25.890161066), (-25, -11.035759956))
            ThreePointArc((-25, -11.035759956), (-21.246950766, -20.57515197), (-12, -25))
            Line((-12, -25), (-10, -25))
            ThreePointArc((-10, -25), (-8.783191003, -24.377140732), (-8.576916353, -23.025834486))
            ThreePointArc((-8.576916353, -23.025834486), (-10.616475204, -9.420494413), (-7.92577262, 4.071177033))
            ThreePointArc((-7.92577262, 4.071177033), (0, 9.5), (7.92577262, 4.071177033))
            ThreePointArc((7.92577262, 4.071177033), (10.616475204, -9.420494413), (8.576916353, -23.025834486))
            ThreePointArc((8.576916353, -23.025834486), (8.783191003, -24.377140732), (10, -25))
            Line((10, -25), (12, -25))
            ThreePointArc((12, -25), (21.246950766, -20.57515197), (25, -11.035759956))
            Line((25, -11.035759956), (25, 0))
            ThreePointArc((25, 0), (24.148145657, 6.470476128), (21.650635095, 12.5))
            Line((21.650635095, 12.5), (-21.650635095, 12.5))
            ThreePointArc((-21.650635095, 12.5), (-24.148145657, 6.470476128), (-25, 0))
            Line((-25, 0), (-25, 10.56531366))
            ThreePointArc((-25, 10.56531366), (-8.174232985, 25.190752437), (13.927271842, 22.269557575))
        make_face()
        with BuildLine():
            ThreePointArc((-10, -25), (-8.783191003, -24.377140732), (-8.576916353, -23.025834486))
            ThreePointArc((-8.576916353, -23.025834486), (-10.616475204, -9.420494413), (-7.92577262, 4.071177033))
            ThreePointArc((-7.92577262, 4.071177033), (0, 9.5), (7.92577262, 4.071177033))
            ThreePointArc((7.92577262, 4.071177033), (10.616475204, -9.420494413), (8.576916353, -23.025834486))
            ThreePointArc((8.576916353, -23.025834486), (8.783191003, -24.377140732), (10, -25))
            Line((10, -25), (12, -25))
            ThreePointArc((12, -25), (21.246950766, -20.57515197), (25, -11.035759956))
            Line((25, -11.035759956), (25, 0))
            ThreePointArc((25, 0), (24.148145657, 6.470476128), (21.650635095, 12.5))
            Line((21.650635095, 12.5), (-21.650635095, 12.5))
            ThreePointArc((-21.650635095, 12.5), (-24.148145657, 6.470476128), (-25, 0))
            Line((-25, 0), (-25, -11.035759956))
            ThreePointArc((-25, -11.035759956), (-21.246950766, -20.57515197), (-12, -25))
            Line((-12, -25), (-10, -25))
        make_face()
    extrude(amount=-CUT_EXTRUDE12_DEPTH, mode=Mode.SUBTRACT)


with BuildPart() as body_2:
    # Sketch13 → Boss-Extrude4 (new, two sides: drawn at the far end of the back side and taken through both)
    with BuildSketch(Plane.XY.offset(50).offset(-BOSS_EXTRUDE4_DEPTH_BACK)):
        with BuildLine():
            Line((-27.5, 0), (-27.5, -18.5))
            ThreePointArc((-27.5, -18.5), (-30, -21), (-32.5, -18.5))
            Line((-32.5, -18.5), (-32.5, -0.08926685))
            ThreePointArc((-32.5, -0.08926685), (-29.569098843, 14.379149235), (-20.424111586, 25.96769762))
            ThreePointArc((-20.424111586, 25.96769762), (-14.603149144, 29.637766733), (-8.139956045, 32))
            Line((-8.139956045, 32), (8.139956045, 32))
            ThreePointArc((8.139956045, 32), (14.603149144, 29.637766733), (20.424111586, 25.96769762))
            ThreePointArc((20.424111586, 25.96769762), (29.569098843, 14.379149235), (32.5, -0.08926685))
            Line((32.5, -0.08926685), (32.5, -18.5))
            ThreePointArc((32.5, -18.5), (30, -21), (27.5, -18.5))
            Line((27.5, -18.5), (27.5, 0))
            ThreePointArc((27.5, 0), (25.04979452, 12.239551007), (17.324653965, 22.044260038))
            ThreePointArc((17.324653965, 22.044260038), (12.662730485, 25.018549885), (7.5, 27))
            Line((7.5, 27), (-7.5, 27))
            ThreePointArc((-7.5, 27), (-12.662730485, 25.018549885), (-17.324653965, 22.044260038))
            ThreePointArc((-17.324653965, 22.044260038), (-25.04979452, 12.239551007), (-27.5, 0))
        make_face()
    extrude(amount=BOSS_EXTRUDE4_DEPTH + BOSS_EXTRUDE4_DEPTH_BACK)

    # Sketch15 → Boss-Extrude6 (add)
    with BuildSketch(Plane.ZY.offset(32.5)):
        with Locations((46.25, -5.517879978)):
            Circle(SKETCH15_R)
        with Locations((46.25, -5.517879978)):
            Circle(SKETCH15_R_2, mode=Mode.SUBTRACT)
    extrude(amount=-BOSS_EXTRUDE6_DEPTH)

    # Sketch16 → Cut-Extrude8 (cut)
    with BuildSketch(Plane(origin=(-27.5, 0, 0), x_dir=(0, 0, -1), z_dir=(1, 0, 0))):
        with Locations(Location((-46.25, -5.517879978, 0), (0, 0, 180))):
            Circle(SKETCH16_R)
    extrude(amount=-CUT_EXTRUDE8_DEPTH, mode=Mode.SUBTRACT)

    # Sketch20 → Boss-Extrude8 (add)
    # profile 1 of 2: a face of its own
    with BuildSketch(Plane(origin=(32.5, 0, 0), x_dir=(0, 0, -1), z_dir=(1, 0, 0))):
        with Locations(Location((-46.25, -5.517879978, 0), (0, 0, 180))):
            Circle(SKETCH20_R)
        with Locations(Location((-46.25, -5.517879978, 0), (0, 0, 180))):
            Circle(SKETCH20_R_2, mode=Mode.SUBTRACT)
    # profile 2 of 2: a face of its own
    with BuildSketch(Plane(origin=(32.5, 0, 0), x_dir=(0, 0, -1), z_dir=(1, 0, 0))):
        with Locations((-78.75, -5.517879978)):
            Circle(SKETCH20_R)
        with Locations((-78.75, -5.517879978)):
            Circle(SKETCH20_R_2, mode=Mode.SUBTRACT)
    extrude(amount=-BOSS_EXTRUDE8_DEPTH)

    # Sketch21 → Cut-Extrude11 (cut)
    with BuildSketch(Plane.ZY.offset(-27.5)):
        with Locations((46.25, -5.517879978)):
            Circle(SKETCH21_R)
    extrude(amount=-CUT_EXTRUDE11_DEPTH, mode=Mode.SUBTRACT)

    # Sketch23 → Cut-Extrude13 (cut)
    with BuildSketch(Plane.ZY.offset(-27.5)):
        with Locations(Location((78.75, -5.517879978, 0), (0, 0, 180))):
            Circle(SKETCH23_R)
    extrude(amount=-CUT_EXTRUDE13_DEPTH, mode=Mode.SUBTRACT)

    # Sketch24 → Cut-Extrude14 (cut)
    with BuildSketch(Plane(origin=(-29.5, 0, 0), x_dir=(0, 0, -1), z_dir=(1, 0, 0))):
        with Locations(Location((-46.25, -5.517879978, 0), (0, 0, 180))):
            Circle(SKETCH24_R)
    extrude(amount=-CUT_EXTRUDE14_DEPTH, mode=Mode.SUBTRACT)

    # Sketch25 → Boss-Extrude9 (add)
    with BuildSketch(Plane.ZY.offset(32.5)):
        with Locations((78.75, -5.51787995)):
            Circle(SKETCH25_R)
        with Locations(Location((78.75, -5.51787995, 0), (0, 0, 180.000000718))):
            Circle(SKETCH25_R_2, mode=Mode.SUBTRACT)
    extrude(amount=-BOSS_EXTRUDE9_DEPTH)

    # Sketch26 → Cut-Extrude15 (cut)
    with BuildSketch(Plane(origin=(-27.5, 0, 0), x_dir=(0, 0, -1), z_dir=(1, 0, 0))):
        with Locations(Location((-78.75, -5.51787995, 0), (0, 0, 359.999999282))):
            Circle(SKETCH26_R)
    extrude(amount=-CUT_EXTRUDE15_DEPTH, mode=Mode.SUBTRACT)


solid = body_2.part
